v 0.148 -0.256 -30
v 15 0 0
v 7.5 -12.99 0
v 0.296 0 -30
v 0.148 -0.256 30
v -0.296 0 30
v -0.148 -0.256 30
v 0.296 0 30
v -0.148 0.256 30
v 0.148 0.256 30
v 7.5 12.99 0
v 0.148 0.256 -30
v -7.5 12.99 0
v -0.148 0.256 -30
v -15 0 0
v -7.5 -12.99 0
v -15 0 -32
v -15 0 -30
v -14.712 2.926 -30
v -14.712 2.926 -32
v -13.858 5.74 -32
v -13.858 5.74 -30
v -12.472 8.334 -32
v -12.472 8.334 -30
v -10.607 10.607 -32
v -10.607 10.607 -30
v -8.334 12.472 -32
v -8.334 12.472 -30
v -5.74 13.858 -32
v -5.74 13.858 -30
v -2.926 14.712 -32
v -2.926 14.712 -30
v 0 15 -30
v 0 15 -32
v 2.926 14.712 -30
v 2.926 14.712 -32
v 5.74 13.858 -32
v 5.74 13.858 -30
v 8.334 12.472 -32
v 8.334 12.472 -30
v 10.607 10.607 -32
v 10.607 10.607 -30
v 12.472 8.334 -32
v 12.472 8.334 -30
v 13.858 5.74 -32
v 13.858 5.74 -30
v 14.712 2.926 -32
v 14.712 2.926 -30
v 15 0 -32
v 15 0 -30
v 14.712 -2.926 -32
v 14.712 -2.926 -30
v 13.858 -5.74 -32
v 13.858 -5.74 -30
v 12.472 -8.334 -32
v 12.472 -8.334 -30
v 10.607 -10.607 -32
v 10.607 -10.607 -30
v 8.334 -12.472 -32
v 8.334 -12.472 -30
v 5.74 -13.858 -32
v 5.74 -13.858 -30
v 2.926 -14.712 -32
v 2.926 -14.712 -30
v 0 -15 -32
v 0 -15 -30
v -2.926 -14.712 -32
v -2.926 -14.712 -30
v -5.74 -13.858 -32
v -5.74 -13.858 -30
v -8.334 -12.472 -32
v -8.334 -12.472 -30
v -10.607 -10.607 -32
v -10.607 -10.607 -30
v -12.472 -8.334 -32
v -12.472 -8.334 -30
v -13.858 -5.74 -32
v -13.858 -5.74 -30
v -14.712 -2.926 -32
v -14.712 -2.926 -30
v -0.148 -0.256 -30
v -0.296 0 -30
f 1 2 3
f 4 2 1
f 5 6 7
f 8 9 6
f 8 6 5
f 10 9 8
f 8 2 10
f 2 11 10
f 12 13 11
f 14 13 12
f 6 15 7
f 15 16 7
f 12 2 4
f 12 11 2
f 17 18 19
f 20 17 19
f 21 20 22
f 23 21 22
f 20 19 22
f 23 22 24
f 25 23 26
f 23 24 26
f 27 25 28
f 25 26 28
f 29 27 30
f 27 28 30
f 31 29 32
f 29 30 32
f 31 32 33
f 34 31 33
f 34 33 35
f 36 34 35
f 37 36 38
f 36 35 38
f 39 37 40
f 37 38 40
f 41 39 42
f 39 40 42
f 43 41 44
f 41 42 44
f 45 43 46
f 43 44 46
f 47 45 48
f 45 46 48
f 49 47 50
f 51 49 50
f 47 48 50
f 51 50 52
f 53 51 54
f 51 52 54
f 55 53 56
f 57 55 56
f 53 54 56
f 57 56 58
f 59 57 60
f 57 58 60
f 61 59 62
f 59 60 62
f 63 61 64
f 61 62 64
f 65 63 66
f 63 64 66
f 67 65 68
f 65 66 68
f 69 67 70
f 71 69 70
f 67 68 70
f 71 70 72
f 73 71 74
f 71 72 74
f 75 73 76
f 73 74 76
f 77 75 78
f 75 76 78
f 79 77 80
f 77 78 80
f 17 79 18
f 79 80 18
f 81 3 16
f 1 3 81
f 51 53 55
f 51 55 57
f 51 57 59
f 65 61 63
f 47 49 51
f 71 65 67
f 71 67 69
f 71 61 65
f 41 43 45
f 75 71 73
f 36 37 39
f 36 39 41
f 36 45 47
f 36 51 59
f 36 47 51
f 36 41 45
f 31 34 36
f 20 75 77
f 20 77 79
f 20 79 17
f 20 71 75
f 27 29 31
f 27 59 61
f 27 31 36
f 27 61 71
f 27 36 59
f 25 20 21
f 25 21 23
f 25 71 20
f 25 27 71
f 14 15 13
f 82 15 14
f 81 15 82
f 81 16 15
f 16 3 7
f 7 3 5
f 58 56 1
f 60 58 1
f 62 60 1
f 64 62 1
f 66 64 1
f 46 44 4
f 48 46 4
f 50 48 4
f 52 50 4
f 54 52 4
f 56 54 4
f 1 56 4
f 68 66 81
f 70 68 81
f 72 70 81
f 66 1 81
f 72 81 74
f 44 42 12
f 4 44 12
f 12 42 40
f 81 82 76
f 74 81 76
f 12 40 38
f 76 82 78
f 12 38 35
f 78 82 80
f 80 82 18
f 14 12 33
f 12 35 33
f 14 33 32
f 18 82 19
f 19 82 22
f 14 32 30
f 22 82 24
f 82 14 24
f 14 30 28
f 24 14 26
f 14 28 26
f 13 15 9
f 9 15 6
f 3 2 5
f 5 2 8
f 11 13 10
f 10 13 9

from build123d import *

# Parameters (mm, degrees)
BOSS_EXTRU_1_DEPTH = 30
BOSS_EXTRU_1_TAPER = 23
ESQUISSE2_R        = 15
BOSS_EXTRU_2_DEPTH = 2


with BuildPart() as part:
    # Esquisse1 → Boss.-Extru.1 (new body)
    with BuildSketch(Plane.XY):
        Polygon((15, 0), (7.5, 12.990381057), (-7.5, 12.990381057), (-15, 0), (-7.5, -12.990381057), (7.5, -12.990381057), align=None)
    boss_extru_1 = extrude(amount=BOSS_EXTRU_1_DEPTH, taper=BOSS_EXTRU_1_TAPER)

    # Symétrie1: Boss.-Extru.1 across plane
    add(boss_extru_1.mirror(Plane.XY))

    # Esquisse2 → Boss.-Extru.2 (add)
    with BuildSketch(Plane(origin=(0, 0, -30), x_dir=(-1, 0, 0), z_dir=(0, 0, -1))):
        Circle(ESQUISSE2_R)
    extrude(amount=BOSS_EXTRU_2_DEPTH)


solid = part.part
